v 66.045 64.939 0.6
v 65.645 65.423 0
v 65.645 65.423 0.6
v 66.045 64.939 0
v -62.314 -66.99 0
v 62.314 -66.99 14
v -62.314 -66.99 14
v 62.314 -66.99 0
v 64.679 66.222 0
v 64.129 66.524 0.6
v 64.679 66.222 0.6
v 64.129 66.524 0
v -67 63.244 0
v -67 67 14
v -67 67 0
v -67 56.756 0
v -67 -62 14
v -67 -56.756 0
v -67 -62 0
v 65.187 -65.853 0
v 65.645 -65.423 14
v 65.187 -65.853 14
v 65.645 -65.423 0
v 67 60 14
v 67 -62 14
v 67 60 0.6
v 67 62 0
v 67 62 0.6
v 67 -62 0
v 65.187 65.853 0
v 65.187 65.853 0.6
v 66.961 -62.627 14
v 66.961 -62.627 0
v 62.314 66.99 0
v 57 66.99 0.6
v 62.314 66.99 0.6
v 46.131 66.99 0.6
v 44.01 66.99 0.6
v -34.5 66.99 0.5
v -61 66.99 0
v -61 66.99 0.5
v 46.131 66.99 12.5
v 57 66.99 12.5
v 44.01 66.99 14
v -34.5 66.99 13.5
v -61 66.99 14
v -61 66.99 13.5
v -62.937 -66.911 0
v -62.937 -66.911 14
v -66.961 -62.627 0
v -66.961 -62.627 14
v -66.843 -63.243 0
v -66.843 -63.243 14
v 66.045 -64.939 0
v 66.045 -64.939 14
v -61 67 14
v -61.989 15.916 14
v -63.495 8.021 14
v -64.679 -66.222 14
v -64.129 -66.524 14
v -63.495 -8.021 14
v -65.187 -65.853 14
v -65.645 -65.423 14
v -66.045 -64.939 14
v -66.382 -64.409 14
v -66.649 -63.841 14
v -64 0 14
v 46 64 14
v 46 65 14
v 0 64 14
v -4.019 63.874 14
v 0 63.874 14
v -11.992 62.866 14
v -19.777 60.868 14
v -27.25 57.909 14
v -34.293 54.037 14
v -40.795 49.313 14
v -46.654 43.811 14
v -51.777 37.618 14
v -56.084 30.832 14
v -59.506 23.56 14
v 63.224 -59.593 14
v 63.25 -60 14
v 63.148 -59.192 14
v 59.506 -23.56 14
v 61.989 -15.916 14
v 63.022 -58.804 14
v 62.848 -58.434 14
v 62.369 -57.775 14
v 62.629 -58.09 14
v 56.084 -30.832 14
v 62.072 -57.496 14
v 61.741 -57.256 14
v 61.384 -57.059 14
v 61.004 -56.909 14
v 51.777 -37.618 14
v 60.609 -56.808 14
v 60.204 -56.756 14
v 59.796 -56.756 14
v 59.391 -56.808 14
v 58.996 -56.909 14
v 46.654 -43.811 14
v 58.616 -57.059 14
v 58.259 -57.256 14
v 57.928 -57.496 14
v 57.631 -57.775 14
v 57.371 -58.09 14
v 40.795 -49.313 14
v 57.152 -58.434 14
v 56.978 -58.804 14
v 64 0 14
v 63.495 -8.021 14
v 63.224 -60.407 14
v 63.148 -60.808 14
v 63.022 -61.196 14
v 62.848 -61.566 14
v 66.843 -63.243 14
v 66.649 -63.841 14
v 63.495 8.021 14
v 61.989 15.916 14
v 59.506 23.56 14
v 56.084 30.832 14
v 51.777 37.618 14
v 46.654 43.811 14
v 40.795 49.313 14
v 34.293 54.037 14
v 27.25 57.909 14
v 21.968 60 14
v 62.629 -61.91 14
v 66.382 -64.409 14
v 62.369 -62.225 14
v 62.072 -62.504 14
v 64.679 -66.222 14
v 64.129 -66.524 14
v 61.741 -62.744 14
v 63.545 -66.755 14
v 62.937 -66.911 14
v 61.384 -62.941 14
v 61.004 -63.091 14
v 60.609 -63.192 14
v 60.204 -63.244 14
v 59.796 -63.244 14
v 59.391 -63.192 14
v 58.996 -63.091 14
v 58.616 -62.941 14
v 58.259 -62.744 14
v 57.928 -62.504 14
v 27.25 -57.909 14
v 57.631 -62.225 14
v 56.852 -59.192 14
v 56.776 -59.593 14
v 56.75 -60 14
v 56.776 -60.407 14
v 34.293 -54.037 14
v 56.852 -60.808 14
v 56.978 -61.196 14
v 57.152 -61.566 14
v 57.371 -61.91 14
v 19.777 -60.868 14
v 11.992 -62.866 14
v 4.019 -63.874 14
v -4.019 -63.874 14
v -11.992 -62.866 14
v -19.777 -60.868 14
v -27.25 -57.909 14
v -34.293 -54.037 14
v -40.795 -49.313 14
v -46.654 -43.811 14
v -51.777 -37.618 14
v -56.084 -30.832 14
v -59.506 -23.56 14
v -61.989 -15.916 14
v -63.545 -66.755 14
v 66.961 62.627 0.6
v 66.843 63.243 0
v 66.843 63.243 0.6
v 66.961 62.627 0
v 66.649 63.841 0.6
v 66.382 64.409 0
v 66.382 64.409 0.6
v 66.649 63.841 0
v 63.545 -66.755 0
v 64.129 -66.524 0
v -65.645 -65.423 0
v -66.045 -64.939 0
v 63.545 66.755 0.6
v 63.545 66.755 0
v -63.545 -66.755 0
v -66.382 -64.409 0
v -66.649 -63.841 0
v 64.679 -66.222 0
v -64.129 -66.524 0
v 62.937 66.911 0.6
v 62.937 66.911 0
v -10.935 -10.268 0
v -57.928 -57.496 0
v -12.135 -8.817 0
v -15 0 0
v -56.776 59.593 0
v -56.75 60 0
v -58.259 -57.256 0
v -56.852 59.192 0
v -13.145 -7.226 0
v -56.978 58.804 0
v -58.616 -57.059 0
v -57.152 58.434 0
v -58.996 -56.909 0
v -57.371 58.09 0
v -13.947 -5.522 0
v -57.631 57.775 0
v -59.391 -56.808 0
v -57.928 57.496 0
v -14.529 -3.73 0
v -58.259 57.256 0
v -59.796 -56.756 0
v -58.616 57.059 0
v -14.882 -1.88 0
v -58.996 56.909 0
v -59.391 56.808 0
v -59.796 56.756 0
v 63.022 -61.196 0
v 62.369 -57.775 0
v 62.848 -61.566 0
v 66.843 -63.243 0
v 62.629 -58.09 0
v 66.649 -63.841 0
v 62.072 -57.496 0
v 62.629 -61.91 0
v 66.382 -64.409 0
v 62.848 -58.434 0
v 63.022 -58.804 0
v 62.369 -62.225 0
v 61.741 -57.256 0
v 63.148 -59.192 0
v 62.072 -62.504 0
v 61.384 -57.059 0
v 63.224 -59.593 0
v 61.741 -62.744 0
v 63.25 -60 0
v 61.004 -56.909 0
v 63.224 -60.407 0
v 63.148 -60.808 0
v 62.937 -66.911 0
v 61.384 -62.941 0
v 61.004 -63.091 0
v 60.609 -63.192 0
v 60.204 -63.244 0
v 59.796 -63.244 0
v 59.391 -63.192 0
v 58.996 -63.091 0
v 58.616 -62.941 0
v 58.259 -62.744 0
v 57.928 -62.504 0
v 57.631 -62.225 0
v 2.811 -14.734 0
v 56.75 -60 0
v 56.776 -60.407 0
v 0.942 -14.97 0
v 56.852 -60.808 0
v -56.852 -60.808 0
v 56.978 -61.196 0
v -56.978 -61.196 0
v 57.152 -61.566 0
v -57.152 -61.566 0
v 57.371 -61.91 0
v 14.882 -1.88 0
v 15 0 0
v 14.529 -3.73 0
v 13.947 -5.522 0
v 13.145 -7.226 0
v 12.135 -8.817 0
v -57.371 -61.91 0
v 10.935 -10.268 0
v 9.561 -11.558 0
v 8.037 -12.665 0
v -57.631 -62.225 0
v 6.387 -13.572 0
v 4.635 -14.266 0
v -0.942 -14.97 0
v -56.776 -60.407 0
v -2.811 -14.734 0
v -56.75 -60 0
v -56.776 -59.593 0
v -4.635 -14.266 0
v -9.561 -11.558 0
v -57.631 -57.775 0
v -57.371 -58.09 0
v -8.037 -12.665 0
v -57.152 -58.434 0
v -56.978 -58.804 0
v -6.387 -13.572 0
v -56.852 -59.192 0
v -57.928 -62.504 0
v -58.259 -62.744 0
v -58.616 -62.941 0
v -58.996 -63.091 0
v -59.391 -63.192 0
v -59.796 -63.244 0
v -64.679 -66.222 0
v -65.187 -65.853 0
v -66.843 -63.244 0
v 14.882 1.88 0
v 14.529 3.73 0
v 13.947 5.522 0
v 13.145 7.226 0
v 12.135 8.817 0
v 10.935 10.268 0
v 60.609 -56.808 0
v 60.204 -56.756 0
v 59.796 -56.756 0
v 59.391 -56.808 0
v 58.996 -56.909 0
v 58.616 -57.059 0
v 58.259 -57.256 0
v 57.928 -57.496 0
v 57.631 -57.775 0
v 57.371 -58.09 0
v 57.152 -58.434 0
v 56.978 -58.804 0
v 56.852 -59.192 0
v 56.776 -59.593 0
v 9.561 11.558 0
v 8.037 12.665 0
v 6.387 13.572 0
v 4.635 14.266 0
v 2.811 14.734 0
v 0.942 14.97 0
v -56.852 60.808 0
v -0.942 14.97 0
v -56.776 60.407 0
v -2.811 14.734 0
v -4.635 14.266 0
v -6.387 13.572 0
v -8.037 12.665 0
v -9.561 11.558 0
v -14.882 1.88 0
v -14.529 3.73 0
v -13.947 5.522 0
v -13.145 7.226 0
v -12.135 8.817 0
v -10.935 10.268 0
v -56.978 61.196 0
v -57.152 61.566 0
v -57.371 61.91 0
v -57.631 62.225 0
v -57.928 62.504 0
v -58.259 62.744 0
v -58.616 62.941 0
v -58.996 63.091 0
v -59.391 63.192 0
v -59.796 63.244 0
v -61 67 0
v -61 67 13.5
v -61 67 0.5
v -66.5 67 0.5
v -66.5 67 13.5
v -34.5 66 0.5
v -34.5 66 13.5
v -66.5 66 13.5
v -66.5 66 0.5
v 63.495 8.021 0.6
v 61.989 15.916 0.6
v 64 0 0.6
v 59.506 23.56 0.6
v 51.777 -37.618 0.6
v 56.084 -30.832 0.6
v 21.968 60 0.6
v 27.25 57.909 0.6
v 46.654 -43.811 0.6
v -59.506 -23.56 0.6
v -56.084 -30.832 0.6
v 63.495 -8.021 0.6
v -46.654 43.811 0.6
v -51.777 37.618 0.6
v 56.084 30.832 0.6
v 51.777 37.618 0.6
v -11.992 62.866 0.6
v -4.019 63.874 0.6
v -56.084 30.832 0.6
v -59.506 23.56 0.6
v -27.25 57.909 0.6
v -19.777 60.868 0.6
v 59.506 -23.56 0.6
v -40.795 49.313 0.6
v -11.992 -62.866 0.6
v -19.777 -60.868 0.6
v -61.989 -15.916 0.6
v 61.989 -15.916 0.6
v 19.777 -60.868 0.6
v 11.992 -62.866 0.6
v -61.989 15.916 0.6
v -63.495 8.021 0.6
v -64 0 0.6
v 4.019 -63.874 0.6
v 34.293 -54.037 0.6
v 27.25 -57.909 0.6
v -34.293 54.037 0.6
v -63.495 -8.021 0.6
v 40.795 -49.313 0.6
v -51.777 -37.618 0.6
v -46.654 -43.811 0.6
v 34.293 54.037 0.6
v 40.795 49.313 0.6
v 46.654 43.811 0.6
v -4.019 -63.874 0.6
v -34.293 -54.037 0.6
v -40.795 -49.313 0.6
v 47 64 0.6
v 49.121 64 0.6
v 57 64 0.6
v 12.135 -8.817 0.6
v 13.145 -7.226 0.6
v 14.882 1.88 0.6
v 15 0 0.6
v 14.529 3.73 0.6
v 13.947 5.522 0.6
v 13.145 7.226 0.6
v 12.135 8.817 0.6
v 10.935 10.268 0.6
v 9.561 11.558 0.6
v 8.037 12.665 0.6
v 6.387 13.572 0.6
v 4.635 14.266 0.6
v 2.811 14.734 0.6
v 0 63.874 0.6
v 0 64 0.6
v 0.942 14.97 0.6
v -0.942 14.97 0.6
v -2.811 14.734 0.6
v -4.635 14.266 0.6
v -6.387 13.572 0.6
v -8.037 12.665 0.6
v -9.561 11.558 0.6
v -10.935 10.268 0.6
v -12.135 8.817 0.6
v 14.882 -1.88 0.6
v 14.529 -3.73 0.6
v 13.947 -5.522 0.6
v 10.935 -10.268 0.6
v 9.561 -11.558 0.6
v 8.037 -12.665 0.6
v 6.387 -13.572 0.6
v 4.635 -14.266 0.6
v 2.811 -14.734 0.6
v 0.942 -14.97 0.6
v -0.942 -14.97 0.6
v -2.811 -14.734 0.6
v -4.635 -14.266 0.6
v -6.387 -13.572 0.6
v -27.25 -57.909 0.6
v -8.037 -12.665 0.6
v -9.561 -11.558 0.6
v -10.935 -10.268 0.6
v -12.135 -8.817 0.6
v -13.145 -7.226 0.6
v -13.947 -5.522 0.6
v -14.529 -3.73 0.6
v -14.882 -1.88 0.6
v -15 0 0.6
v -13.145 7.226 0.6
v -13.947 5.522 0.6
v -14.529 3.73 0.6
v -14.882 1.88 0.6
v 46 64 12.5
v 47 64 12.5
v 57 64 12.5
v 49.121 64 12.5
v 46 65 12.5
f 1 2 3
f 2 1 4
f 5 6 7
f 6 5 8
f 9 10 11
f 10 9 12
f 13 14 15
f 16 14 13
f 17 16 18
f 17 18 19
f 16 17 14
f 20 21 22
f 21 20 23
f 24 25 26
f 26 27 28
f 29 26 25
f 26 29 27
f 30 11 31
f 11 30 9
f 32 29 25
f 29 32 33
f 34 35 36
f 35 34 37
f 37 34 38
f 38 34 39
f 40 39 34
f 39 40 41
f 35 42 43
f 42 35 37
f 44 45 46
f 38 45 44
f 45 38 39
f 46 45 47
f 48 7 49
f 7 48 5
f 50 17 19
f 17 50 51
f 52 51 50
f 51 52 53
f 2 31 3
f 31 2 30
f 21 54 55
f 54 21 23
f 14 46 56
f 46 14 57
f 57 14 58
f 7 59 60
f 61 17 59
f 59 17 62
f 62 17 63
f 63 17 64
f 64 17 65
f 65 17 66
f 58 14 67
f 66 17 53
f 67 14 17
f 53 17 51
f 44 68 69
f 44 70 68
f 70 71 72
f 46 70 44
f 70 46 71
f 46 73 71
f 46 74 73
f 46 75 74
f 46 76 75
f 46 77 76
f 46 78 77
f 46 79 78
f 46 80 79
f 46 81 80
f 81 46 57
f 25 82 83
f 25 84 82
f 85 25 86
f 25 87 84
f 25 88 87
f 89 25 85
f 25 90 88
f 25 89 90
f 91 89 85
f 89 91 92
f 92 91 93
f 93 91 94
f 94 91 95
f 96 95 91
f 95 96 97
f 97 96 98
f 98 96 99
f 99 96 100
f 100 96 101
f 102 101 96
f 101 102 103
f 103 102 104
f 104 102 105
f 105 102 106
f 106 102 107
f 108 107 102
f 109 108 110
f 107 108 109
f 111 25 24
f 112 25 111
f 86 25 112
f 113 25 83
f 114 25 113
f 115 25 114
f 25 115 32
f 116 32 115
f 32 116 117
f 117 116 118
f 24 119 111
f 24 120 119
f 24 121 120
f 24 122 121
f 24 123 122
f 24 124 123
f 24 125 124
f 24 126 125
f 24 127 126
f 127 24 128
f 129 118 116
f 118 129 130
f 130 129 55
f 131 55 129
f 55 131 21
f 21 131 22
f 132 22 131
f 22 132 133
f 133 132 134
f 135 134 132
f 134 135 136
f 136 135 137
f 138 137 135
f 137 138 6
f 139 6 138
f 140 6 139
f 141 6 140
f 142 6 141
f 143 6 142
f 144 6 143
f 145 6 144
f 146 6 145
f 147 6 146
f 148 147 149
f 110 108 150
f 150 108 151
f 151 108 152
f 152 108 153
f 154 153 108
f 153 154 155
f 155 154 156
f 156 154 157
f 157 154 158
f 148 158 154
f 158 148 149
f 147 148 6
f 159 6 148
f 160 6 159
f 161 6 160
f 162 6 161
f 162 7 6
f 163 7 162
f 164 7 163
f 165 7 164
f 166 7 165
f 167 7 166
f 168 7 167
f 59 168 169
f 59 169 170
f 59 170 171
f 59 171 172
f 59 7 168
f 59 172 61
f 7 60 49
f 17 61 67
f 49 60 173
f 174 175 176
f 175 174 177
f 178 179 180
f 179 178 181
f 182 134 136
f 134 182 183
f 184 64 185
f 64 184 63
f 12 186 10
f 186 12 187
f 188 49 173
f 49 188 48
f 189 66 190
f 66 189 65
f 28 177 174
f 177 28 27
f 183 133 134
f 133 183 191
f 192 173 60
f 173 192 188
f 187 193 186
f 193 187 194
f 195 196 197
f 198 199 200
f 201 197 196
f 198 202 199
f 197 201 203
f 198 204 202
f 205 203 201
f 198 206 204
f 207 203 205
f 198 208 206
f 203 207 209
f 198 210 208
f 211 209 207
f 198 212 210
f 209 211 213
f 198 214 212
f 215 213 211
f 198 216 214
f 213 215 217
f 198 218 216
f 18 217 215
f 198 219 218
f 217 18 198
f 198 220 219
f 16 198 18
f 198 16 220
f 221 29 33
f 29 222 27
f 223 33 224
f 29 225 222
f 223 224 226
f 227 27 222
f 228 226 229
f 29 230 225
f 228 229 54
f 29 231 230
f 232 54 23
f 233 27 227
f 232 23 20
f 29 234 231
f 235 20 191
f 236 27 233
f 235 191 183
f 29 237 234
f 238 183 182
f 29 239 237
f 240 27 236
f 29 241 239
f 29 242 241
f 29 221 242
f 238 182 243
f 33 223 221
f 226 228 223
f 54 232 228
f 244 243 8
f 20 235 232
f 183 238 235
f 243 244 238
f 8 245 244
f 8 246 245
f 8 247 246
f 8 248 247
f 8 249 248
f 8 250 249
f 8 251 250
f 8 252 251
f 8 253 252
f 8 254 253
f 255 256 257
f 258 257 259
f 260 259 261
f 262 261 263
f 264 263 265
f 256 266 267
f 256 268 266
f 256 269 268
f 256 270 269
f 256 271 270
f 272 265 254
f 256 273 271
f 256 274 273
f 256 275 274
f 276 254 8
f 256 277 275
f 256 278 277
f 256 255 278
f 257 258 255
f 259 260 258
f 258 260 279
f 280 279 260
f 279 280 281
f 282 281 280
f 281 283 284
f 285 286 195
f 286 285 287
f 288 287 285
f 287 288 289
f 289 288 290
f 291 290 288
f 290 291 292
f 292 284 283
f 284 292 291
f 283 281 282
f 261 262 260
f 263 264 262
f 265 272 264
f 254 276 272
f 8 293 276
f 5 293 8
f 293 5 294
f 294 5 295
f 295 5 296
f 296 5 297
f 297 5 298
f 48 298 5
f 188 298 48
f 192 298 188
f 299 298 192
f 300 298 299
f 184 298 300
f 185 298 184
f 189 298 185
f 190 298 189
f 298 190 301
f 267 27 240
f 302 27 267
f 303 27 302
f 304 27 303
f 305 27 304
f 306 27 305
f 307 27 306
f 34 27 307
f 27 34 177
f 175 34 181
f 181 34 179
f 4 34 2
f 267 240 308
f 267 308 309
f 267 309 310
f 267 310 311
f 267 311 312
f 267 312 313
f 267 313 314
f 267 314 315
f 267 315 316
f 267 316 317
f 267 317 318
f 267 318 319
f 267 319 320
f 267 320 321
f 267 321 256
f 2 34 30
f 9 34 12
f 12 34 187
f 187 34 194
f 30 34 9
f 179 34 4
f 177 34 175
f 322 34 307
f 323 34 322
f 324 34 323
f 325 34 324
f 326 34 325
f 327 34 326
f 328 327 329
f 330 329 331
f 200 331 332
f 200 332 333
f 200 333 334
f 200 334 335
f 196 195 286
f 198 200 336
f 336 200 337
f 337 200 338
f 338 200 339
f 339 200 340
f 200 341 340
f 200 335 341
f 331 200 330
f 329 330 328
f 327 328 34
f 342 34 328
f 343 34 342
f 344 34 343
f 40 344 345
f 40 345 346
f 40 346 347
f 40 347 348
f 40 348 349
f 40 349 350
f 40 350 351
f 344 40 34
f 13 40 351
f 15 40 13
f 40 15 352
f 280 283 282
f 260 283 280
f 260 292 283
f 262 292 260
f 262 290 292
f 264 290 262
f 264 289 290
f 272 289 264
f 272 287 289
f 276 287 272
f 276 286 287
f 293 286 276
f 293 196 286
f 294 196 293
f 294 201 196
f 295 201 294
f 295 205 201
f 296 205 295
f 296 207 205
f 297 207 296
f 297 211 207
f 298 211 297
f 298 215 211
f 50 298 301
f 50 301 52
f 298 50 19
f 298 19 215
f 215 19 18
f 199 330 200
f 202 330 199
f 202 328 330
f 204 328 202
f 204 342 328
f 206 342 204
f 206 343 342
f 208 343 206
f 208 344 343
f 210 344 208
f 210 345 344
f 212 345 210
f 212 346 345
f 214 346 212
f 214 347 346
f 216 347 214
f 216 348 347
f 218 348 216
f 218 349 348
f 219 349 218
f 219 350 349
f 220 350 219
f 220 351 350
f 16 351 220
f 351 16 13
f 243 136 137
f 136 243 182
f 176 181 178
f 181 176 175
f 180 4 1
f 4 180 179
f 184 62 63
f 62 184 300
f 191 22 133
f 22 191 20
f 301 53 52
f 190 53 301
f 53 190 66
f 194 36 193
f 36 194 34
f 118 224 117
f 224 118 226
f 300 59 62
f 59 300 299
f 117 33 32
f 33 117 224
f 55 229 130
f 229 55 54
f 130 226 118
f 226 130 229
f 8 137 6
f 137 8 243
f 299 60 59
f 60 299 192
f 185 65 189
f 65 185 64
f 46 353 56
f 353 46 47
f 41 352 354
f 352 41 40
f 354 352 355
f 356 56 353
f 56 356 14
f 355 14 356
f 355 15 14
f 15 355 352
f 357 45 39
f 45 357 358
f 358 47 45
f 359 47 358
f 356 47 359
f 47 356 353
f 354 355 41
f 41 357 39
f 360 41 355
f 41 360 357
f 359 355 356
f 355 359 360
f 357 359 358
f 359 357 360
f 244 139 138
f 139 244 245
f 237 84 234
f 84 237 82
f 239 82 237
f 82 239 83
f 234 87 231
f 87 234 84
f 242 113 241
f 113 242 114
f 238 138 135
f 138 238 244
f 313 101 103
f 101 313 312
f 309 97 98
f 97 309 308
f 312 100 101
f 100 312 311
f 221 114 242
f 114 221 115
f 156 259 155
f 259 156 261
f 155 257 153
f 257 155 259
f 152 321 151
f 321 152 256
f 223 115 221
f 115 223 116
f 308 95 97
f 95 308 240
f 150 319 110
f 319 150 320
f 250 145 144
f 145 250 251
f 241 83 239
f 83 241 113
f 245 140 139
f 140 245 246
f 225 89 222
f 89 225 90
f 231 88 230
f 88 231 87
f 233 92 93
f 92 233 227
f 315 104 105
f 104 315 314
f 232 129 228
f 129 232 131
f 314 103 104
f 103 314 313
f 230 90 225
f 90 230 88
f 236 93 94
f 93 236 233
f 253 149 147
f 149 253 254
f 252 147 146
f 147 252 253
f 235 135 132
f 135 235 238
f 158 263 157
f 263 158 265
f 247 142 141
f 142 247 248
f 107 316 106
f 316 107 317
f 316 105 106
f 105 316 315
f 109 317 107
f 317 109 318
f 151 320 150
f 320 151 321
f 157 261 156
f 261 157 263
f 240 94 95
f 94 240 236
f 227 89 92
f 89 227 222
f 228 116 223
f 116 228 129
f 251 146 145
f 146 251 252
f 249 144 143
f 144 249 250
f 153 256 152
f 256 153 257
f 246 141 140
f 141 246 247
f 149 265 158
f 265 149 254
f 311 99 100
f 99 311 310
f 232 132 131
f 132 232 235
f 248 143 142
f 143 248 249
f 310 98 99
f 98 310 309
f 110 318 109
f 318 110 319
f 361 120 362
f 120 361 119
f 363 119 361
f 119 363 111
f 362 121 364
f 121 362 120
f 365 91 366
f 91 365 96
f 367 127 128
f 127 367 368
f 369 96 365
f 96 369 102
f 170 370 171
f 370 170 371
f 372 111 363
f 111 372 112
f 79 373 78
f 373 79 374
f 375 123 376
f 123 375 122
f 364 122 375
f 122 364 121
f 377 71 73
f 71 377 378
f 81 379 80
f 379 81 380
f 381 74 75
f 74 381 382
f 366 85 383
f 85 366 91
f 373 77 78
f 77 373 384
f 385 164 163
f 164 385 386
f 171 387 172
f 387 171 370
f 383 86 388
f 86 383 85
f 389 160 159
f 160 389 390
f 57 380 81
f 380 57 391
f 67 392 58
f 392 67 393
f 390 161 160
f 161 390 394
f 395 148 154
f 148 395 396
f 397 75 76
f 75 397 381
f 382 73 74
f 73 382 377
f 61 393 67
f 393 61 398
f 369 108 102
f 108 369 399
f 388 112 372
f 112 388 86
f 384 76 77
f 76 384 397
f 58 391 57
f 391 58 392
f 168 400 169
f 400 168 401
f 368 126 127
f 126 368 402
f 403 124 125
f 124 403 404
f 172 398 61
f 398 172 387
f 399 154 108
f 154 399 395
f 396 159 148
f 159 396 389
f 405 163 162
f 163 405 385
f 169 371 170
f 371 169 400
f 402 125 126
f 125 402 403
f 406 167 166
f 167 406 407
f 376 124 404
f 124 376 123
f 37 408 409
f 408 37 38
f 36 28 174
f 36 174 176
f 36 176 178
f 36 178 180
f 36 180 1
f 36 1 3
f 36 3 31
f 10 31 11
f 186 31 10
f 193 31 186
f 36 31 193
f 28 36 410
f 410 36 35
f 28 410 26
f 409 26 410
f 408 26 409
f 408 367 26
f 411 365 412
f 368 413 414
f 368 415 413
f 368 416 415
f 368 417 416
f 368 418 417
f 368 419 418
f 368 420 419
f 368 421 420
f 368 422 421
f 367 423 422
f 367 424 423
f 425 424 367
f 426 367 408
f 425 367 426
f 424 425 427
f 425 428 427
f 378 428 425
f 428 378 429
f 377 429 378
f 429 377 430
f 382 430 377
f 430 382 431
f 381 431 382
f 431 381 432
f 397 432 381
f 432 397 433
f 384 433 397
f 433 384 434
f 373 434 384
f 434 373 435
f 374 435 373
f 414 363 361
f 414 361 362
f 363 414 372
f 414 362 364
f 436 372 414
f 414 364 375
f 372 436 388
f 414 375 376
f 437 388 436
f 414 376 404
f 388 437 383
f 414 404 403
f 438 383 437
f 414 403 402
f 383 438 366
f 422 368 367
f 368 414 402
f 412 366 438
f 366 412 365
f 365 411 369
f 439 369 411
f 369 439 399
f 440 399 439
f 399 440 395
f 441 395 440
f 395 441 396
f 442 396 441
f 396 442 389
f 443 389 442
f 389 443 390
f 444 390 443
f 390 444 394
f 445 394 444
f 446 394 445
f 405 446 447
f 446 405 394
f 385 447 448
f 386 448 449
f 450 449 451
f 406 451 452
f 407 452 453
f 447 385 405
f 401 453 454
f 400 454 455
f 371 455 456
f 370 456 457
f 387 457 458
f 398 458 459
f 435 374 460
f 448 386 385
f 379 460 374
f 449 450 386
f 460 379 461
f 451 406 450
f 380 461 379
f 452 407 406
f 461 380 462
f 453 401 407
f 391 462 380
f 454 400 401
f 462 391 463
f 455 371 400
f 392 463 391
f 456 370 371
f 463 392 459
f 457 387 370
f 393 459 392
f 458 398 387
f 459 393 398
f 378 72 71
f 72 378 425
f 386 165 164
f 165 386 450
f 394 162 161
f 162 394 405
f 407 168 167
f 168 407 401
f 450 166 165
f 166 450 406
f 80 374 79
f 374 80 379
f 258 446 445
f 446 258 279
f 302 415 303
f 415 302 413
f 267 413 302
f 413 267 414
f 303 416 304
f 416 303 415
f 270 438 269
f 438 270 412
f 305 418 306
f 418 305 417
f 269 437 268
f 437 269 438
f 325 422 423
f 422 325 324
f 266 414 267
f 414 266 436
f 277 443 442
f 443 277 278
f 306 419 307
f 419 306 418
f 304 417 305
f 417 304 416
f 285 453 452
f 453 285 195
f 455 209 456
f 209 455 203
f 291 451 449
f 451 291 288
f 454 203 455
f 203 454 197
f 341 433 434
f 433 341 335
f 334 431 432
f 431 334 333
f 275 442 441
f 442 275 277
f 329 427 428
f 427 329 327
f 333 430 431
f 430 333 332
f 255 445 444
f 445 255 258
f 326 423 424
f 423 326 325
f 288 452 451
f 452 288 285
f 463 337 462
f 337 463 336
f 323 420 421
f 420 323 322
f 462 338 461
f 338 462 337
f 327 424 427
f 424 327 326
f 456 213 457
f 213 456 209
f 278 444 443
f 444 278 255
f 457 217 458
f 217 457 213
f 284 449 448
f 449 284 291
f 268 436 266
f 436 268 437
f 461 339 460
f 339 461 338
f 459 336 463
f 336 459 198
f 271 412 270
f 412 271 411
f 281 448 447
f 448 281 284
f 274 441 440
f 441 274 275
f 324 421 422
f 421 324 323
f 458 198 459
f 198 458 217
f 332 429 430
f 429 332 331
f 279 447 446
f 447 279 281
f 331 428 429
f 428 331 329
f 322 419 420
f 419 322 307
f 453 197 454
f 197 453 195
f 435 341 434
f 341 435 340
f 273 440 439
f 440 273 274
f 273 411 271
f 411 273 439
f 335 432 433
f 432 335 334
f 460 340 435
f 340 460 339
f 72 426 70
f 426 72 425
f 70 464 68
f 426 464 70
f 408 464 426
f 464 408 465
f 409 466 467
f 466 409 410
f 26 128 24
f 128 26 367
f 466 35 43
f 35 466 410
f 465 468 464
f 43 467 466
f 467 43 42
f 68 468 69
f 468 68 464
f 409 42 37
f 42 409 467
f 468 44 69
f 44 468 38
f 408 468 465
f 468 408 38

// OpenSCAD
$fn = 50;


difference() {
	union() {
		hull() {
			translate(v = [-62.0000000000, 62.0000000000, 0]) {
				cylinder(h = 14, r = 5);
			}
			translate(v = [62.0000000000, 62.0000000000, 0]) {
				cylinder(h = 14, r = 5);
			}
			translate(v = [-62.0000000000, -62.0000000000, 0]) {
				cylinder(h = 14, r = 5);
			}
			translate(v = [62.0000000000, -62.0000000000, 0]) {
				cylinder(h = 14, r = 5);
			}
		}
		translate(v = [-67.0000000000, 61.0000000000, 0]) {
			cube(size = [6, 6, 14]);
		}
	}
	union() {
		translate(v = [-67.5000000000, -60.0000000000, -250.0000000000]) {
			rotate(a = [0, 0, 0]) {
				difference() {
					union() {
						hull() {
							translate(v = [7.5000000000, 0, 0]) {
								cylinder(h = 250, r = 3.2500000000, r1 = 3.2500000000, r2 = 3.2500000000);
							}
							translate(v = [-7.5000000000, 0, 0]) {
								cylinder(h = 250, r = 3.2500000000, r1 = 3.2500000000, r2 = 3.2500000000);
							}
						}
					}
					union();
				}
			}
		}
		translate(v = [-67.5000000000, 60.0000000000, -250.0000000000]) {
			rotate(a = [0, 0, 0]) {
				difference() {
					union() {
						hull() {
							translate(v = [7.5000000000, 0, 0]) {
								cylinder(h = 250, r = 3.2500000000, r1 = 3.2500000000, r2 = 3.2500000000);
							}
							translate(v = [-7.5000000000, 0, 0]) {
								cylinder(h = 250, r = 3.2500000000, r1 = 3.2500000000, r2 = 3.2500000000);
							}
						}
					}
					union();
				}
			}
		}
		translate(v = [-66.5000000000, 66.0000000000, 0.5000000000]) {
			cube(size = [32, 1, 13.0000000000]);
		}
		translate(v = [60.0000000000, -60.0000000000, -50.0000000000]) {
			cylinder(h = 100, r = 3.2500000000);
		}
		translate(v = [0, 0, 0.6000000000]) {
			cylinder(h = 16.4000000000, r = 64.0000000000);
		}
		translate(v = [0, 0, -7.0000000000]) {
			cylinder(h = 14, r = 15.0000000000);
		}
		translate(v = [0.0000000000, 60.0000000000, 0.6000000000]) {
			cube(size = [67.0000000000, 4, 16.4000000000]);
		}
		translate(v = [57.0000000000, 60.0000000000, 0.6000000000]) {
			cube(size = [10, 7, 16.4000000000]);
		}
		translate(v = [46.0000000000, 60.0000000000, 12.5000000000]) {
			cube(size = [21, 7, 1.5000000000]);
		}
		translate(v = [43.2500000000, 67.7500000000, 0.6000000000]) {
			rotate(a = [0, 0, -45]) {
				cube(size = [7.5000000000, 1.5000000000, 16.4000000000]);
			}
		}
		translate(v = [12.0610000000, 58.0000000000, 0.6000000000]) {
			cube(size = [7.5000000000, 2, 13.4000000000]);
		}
	}
}
